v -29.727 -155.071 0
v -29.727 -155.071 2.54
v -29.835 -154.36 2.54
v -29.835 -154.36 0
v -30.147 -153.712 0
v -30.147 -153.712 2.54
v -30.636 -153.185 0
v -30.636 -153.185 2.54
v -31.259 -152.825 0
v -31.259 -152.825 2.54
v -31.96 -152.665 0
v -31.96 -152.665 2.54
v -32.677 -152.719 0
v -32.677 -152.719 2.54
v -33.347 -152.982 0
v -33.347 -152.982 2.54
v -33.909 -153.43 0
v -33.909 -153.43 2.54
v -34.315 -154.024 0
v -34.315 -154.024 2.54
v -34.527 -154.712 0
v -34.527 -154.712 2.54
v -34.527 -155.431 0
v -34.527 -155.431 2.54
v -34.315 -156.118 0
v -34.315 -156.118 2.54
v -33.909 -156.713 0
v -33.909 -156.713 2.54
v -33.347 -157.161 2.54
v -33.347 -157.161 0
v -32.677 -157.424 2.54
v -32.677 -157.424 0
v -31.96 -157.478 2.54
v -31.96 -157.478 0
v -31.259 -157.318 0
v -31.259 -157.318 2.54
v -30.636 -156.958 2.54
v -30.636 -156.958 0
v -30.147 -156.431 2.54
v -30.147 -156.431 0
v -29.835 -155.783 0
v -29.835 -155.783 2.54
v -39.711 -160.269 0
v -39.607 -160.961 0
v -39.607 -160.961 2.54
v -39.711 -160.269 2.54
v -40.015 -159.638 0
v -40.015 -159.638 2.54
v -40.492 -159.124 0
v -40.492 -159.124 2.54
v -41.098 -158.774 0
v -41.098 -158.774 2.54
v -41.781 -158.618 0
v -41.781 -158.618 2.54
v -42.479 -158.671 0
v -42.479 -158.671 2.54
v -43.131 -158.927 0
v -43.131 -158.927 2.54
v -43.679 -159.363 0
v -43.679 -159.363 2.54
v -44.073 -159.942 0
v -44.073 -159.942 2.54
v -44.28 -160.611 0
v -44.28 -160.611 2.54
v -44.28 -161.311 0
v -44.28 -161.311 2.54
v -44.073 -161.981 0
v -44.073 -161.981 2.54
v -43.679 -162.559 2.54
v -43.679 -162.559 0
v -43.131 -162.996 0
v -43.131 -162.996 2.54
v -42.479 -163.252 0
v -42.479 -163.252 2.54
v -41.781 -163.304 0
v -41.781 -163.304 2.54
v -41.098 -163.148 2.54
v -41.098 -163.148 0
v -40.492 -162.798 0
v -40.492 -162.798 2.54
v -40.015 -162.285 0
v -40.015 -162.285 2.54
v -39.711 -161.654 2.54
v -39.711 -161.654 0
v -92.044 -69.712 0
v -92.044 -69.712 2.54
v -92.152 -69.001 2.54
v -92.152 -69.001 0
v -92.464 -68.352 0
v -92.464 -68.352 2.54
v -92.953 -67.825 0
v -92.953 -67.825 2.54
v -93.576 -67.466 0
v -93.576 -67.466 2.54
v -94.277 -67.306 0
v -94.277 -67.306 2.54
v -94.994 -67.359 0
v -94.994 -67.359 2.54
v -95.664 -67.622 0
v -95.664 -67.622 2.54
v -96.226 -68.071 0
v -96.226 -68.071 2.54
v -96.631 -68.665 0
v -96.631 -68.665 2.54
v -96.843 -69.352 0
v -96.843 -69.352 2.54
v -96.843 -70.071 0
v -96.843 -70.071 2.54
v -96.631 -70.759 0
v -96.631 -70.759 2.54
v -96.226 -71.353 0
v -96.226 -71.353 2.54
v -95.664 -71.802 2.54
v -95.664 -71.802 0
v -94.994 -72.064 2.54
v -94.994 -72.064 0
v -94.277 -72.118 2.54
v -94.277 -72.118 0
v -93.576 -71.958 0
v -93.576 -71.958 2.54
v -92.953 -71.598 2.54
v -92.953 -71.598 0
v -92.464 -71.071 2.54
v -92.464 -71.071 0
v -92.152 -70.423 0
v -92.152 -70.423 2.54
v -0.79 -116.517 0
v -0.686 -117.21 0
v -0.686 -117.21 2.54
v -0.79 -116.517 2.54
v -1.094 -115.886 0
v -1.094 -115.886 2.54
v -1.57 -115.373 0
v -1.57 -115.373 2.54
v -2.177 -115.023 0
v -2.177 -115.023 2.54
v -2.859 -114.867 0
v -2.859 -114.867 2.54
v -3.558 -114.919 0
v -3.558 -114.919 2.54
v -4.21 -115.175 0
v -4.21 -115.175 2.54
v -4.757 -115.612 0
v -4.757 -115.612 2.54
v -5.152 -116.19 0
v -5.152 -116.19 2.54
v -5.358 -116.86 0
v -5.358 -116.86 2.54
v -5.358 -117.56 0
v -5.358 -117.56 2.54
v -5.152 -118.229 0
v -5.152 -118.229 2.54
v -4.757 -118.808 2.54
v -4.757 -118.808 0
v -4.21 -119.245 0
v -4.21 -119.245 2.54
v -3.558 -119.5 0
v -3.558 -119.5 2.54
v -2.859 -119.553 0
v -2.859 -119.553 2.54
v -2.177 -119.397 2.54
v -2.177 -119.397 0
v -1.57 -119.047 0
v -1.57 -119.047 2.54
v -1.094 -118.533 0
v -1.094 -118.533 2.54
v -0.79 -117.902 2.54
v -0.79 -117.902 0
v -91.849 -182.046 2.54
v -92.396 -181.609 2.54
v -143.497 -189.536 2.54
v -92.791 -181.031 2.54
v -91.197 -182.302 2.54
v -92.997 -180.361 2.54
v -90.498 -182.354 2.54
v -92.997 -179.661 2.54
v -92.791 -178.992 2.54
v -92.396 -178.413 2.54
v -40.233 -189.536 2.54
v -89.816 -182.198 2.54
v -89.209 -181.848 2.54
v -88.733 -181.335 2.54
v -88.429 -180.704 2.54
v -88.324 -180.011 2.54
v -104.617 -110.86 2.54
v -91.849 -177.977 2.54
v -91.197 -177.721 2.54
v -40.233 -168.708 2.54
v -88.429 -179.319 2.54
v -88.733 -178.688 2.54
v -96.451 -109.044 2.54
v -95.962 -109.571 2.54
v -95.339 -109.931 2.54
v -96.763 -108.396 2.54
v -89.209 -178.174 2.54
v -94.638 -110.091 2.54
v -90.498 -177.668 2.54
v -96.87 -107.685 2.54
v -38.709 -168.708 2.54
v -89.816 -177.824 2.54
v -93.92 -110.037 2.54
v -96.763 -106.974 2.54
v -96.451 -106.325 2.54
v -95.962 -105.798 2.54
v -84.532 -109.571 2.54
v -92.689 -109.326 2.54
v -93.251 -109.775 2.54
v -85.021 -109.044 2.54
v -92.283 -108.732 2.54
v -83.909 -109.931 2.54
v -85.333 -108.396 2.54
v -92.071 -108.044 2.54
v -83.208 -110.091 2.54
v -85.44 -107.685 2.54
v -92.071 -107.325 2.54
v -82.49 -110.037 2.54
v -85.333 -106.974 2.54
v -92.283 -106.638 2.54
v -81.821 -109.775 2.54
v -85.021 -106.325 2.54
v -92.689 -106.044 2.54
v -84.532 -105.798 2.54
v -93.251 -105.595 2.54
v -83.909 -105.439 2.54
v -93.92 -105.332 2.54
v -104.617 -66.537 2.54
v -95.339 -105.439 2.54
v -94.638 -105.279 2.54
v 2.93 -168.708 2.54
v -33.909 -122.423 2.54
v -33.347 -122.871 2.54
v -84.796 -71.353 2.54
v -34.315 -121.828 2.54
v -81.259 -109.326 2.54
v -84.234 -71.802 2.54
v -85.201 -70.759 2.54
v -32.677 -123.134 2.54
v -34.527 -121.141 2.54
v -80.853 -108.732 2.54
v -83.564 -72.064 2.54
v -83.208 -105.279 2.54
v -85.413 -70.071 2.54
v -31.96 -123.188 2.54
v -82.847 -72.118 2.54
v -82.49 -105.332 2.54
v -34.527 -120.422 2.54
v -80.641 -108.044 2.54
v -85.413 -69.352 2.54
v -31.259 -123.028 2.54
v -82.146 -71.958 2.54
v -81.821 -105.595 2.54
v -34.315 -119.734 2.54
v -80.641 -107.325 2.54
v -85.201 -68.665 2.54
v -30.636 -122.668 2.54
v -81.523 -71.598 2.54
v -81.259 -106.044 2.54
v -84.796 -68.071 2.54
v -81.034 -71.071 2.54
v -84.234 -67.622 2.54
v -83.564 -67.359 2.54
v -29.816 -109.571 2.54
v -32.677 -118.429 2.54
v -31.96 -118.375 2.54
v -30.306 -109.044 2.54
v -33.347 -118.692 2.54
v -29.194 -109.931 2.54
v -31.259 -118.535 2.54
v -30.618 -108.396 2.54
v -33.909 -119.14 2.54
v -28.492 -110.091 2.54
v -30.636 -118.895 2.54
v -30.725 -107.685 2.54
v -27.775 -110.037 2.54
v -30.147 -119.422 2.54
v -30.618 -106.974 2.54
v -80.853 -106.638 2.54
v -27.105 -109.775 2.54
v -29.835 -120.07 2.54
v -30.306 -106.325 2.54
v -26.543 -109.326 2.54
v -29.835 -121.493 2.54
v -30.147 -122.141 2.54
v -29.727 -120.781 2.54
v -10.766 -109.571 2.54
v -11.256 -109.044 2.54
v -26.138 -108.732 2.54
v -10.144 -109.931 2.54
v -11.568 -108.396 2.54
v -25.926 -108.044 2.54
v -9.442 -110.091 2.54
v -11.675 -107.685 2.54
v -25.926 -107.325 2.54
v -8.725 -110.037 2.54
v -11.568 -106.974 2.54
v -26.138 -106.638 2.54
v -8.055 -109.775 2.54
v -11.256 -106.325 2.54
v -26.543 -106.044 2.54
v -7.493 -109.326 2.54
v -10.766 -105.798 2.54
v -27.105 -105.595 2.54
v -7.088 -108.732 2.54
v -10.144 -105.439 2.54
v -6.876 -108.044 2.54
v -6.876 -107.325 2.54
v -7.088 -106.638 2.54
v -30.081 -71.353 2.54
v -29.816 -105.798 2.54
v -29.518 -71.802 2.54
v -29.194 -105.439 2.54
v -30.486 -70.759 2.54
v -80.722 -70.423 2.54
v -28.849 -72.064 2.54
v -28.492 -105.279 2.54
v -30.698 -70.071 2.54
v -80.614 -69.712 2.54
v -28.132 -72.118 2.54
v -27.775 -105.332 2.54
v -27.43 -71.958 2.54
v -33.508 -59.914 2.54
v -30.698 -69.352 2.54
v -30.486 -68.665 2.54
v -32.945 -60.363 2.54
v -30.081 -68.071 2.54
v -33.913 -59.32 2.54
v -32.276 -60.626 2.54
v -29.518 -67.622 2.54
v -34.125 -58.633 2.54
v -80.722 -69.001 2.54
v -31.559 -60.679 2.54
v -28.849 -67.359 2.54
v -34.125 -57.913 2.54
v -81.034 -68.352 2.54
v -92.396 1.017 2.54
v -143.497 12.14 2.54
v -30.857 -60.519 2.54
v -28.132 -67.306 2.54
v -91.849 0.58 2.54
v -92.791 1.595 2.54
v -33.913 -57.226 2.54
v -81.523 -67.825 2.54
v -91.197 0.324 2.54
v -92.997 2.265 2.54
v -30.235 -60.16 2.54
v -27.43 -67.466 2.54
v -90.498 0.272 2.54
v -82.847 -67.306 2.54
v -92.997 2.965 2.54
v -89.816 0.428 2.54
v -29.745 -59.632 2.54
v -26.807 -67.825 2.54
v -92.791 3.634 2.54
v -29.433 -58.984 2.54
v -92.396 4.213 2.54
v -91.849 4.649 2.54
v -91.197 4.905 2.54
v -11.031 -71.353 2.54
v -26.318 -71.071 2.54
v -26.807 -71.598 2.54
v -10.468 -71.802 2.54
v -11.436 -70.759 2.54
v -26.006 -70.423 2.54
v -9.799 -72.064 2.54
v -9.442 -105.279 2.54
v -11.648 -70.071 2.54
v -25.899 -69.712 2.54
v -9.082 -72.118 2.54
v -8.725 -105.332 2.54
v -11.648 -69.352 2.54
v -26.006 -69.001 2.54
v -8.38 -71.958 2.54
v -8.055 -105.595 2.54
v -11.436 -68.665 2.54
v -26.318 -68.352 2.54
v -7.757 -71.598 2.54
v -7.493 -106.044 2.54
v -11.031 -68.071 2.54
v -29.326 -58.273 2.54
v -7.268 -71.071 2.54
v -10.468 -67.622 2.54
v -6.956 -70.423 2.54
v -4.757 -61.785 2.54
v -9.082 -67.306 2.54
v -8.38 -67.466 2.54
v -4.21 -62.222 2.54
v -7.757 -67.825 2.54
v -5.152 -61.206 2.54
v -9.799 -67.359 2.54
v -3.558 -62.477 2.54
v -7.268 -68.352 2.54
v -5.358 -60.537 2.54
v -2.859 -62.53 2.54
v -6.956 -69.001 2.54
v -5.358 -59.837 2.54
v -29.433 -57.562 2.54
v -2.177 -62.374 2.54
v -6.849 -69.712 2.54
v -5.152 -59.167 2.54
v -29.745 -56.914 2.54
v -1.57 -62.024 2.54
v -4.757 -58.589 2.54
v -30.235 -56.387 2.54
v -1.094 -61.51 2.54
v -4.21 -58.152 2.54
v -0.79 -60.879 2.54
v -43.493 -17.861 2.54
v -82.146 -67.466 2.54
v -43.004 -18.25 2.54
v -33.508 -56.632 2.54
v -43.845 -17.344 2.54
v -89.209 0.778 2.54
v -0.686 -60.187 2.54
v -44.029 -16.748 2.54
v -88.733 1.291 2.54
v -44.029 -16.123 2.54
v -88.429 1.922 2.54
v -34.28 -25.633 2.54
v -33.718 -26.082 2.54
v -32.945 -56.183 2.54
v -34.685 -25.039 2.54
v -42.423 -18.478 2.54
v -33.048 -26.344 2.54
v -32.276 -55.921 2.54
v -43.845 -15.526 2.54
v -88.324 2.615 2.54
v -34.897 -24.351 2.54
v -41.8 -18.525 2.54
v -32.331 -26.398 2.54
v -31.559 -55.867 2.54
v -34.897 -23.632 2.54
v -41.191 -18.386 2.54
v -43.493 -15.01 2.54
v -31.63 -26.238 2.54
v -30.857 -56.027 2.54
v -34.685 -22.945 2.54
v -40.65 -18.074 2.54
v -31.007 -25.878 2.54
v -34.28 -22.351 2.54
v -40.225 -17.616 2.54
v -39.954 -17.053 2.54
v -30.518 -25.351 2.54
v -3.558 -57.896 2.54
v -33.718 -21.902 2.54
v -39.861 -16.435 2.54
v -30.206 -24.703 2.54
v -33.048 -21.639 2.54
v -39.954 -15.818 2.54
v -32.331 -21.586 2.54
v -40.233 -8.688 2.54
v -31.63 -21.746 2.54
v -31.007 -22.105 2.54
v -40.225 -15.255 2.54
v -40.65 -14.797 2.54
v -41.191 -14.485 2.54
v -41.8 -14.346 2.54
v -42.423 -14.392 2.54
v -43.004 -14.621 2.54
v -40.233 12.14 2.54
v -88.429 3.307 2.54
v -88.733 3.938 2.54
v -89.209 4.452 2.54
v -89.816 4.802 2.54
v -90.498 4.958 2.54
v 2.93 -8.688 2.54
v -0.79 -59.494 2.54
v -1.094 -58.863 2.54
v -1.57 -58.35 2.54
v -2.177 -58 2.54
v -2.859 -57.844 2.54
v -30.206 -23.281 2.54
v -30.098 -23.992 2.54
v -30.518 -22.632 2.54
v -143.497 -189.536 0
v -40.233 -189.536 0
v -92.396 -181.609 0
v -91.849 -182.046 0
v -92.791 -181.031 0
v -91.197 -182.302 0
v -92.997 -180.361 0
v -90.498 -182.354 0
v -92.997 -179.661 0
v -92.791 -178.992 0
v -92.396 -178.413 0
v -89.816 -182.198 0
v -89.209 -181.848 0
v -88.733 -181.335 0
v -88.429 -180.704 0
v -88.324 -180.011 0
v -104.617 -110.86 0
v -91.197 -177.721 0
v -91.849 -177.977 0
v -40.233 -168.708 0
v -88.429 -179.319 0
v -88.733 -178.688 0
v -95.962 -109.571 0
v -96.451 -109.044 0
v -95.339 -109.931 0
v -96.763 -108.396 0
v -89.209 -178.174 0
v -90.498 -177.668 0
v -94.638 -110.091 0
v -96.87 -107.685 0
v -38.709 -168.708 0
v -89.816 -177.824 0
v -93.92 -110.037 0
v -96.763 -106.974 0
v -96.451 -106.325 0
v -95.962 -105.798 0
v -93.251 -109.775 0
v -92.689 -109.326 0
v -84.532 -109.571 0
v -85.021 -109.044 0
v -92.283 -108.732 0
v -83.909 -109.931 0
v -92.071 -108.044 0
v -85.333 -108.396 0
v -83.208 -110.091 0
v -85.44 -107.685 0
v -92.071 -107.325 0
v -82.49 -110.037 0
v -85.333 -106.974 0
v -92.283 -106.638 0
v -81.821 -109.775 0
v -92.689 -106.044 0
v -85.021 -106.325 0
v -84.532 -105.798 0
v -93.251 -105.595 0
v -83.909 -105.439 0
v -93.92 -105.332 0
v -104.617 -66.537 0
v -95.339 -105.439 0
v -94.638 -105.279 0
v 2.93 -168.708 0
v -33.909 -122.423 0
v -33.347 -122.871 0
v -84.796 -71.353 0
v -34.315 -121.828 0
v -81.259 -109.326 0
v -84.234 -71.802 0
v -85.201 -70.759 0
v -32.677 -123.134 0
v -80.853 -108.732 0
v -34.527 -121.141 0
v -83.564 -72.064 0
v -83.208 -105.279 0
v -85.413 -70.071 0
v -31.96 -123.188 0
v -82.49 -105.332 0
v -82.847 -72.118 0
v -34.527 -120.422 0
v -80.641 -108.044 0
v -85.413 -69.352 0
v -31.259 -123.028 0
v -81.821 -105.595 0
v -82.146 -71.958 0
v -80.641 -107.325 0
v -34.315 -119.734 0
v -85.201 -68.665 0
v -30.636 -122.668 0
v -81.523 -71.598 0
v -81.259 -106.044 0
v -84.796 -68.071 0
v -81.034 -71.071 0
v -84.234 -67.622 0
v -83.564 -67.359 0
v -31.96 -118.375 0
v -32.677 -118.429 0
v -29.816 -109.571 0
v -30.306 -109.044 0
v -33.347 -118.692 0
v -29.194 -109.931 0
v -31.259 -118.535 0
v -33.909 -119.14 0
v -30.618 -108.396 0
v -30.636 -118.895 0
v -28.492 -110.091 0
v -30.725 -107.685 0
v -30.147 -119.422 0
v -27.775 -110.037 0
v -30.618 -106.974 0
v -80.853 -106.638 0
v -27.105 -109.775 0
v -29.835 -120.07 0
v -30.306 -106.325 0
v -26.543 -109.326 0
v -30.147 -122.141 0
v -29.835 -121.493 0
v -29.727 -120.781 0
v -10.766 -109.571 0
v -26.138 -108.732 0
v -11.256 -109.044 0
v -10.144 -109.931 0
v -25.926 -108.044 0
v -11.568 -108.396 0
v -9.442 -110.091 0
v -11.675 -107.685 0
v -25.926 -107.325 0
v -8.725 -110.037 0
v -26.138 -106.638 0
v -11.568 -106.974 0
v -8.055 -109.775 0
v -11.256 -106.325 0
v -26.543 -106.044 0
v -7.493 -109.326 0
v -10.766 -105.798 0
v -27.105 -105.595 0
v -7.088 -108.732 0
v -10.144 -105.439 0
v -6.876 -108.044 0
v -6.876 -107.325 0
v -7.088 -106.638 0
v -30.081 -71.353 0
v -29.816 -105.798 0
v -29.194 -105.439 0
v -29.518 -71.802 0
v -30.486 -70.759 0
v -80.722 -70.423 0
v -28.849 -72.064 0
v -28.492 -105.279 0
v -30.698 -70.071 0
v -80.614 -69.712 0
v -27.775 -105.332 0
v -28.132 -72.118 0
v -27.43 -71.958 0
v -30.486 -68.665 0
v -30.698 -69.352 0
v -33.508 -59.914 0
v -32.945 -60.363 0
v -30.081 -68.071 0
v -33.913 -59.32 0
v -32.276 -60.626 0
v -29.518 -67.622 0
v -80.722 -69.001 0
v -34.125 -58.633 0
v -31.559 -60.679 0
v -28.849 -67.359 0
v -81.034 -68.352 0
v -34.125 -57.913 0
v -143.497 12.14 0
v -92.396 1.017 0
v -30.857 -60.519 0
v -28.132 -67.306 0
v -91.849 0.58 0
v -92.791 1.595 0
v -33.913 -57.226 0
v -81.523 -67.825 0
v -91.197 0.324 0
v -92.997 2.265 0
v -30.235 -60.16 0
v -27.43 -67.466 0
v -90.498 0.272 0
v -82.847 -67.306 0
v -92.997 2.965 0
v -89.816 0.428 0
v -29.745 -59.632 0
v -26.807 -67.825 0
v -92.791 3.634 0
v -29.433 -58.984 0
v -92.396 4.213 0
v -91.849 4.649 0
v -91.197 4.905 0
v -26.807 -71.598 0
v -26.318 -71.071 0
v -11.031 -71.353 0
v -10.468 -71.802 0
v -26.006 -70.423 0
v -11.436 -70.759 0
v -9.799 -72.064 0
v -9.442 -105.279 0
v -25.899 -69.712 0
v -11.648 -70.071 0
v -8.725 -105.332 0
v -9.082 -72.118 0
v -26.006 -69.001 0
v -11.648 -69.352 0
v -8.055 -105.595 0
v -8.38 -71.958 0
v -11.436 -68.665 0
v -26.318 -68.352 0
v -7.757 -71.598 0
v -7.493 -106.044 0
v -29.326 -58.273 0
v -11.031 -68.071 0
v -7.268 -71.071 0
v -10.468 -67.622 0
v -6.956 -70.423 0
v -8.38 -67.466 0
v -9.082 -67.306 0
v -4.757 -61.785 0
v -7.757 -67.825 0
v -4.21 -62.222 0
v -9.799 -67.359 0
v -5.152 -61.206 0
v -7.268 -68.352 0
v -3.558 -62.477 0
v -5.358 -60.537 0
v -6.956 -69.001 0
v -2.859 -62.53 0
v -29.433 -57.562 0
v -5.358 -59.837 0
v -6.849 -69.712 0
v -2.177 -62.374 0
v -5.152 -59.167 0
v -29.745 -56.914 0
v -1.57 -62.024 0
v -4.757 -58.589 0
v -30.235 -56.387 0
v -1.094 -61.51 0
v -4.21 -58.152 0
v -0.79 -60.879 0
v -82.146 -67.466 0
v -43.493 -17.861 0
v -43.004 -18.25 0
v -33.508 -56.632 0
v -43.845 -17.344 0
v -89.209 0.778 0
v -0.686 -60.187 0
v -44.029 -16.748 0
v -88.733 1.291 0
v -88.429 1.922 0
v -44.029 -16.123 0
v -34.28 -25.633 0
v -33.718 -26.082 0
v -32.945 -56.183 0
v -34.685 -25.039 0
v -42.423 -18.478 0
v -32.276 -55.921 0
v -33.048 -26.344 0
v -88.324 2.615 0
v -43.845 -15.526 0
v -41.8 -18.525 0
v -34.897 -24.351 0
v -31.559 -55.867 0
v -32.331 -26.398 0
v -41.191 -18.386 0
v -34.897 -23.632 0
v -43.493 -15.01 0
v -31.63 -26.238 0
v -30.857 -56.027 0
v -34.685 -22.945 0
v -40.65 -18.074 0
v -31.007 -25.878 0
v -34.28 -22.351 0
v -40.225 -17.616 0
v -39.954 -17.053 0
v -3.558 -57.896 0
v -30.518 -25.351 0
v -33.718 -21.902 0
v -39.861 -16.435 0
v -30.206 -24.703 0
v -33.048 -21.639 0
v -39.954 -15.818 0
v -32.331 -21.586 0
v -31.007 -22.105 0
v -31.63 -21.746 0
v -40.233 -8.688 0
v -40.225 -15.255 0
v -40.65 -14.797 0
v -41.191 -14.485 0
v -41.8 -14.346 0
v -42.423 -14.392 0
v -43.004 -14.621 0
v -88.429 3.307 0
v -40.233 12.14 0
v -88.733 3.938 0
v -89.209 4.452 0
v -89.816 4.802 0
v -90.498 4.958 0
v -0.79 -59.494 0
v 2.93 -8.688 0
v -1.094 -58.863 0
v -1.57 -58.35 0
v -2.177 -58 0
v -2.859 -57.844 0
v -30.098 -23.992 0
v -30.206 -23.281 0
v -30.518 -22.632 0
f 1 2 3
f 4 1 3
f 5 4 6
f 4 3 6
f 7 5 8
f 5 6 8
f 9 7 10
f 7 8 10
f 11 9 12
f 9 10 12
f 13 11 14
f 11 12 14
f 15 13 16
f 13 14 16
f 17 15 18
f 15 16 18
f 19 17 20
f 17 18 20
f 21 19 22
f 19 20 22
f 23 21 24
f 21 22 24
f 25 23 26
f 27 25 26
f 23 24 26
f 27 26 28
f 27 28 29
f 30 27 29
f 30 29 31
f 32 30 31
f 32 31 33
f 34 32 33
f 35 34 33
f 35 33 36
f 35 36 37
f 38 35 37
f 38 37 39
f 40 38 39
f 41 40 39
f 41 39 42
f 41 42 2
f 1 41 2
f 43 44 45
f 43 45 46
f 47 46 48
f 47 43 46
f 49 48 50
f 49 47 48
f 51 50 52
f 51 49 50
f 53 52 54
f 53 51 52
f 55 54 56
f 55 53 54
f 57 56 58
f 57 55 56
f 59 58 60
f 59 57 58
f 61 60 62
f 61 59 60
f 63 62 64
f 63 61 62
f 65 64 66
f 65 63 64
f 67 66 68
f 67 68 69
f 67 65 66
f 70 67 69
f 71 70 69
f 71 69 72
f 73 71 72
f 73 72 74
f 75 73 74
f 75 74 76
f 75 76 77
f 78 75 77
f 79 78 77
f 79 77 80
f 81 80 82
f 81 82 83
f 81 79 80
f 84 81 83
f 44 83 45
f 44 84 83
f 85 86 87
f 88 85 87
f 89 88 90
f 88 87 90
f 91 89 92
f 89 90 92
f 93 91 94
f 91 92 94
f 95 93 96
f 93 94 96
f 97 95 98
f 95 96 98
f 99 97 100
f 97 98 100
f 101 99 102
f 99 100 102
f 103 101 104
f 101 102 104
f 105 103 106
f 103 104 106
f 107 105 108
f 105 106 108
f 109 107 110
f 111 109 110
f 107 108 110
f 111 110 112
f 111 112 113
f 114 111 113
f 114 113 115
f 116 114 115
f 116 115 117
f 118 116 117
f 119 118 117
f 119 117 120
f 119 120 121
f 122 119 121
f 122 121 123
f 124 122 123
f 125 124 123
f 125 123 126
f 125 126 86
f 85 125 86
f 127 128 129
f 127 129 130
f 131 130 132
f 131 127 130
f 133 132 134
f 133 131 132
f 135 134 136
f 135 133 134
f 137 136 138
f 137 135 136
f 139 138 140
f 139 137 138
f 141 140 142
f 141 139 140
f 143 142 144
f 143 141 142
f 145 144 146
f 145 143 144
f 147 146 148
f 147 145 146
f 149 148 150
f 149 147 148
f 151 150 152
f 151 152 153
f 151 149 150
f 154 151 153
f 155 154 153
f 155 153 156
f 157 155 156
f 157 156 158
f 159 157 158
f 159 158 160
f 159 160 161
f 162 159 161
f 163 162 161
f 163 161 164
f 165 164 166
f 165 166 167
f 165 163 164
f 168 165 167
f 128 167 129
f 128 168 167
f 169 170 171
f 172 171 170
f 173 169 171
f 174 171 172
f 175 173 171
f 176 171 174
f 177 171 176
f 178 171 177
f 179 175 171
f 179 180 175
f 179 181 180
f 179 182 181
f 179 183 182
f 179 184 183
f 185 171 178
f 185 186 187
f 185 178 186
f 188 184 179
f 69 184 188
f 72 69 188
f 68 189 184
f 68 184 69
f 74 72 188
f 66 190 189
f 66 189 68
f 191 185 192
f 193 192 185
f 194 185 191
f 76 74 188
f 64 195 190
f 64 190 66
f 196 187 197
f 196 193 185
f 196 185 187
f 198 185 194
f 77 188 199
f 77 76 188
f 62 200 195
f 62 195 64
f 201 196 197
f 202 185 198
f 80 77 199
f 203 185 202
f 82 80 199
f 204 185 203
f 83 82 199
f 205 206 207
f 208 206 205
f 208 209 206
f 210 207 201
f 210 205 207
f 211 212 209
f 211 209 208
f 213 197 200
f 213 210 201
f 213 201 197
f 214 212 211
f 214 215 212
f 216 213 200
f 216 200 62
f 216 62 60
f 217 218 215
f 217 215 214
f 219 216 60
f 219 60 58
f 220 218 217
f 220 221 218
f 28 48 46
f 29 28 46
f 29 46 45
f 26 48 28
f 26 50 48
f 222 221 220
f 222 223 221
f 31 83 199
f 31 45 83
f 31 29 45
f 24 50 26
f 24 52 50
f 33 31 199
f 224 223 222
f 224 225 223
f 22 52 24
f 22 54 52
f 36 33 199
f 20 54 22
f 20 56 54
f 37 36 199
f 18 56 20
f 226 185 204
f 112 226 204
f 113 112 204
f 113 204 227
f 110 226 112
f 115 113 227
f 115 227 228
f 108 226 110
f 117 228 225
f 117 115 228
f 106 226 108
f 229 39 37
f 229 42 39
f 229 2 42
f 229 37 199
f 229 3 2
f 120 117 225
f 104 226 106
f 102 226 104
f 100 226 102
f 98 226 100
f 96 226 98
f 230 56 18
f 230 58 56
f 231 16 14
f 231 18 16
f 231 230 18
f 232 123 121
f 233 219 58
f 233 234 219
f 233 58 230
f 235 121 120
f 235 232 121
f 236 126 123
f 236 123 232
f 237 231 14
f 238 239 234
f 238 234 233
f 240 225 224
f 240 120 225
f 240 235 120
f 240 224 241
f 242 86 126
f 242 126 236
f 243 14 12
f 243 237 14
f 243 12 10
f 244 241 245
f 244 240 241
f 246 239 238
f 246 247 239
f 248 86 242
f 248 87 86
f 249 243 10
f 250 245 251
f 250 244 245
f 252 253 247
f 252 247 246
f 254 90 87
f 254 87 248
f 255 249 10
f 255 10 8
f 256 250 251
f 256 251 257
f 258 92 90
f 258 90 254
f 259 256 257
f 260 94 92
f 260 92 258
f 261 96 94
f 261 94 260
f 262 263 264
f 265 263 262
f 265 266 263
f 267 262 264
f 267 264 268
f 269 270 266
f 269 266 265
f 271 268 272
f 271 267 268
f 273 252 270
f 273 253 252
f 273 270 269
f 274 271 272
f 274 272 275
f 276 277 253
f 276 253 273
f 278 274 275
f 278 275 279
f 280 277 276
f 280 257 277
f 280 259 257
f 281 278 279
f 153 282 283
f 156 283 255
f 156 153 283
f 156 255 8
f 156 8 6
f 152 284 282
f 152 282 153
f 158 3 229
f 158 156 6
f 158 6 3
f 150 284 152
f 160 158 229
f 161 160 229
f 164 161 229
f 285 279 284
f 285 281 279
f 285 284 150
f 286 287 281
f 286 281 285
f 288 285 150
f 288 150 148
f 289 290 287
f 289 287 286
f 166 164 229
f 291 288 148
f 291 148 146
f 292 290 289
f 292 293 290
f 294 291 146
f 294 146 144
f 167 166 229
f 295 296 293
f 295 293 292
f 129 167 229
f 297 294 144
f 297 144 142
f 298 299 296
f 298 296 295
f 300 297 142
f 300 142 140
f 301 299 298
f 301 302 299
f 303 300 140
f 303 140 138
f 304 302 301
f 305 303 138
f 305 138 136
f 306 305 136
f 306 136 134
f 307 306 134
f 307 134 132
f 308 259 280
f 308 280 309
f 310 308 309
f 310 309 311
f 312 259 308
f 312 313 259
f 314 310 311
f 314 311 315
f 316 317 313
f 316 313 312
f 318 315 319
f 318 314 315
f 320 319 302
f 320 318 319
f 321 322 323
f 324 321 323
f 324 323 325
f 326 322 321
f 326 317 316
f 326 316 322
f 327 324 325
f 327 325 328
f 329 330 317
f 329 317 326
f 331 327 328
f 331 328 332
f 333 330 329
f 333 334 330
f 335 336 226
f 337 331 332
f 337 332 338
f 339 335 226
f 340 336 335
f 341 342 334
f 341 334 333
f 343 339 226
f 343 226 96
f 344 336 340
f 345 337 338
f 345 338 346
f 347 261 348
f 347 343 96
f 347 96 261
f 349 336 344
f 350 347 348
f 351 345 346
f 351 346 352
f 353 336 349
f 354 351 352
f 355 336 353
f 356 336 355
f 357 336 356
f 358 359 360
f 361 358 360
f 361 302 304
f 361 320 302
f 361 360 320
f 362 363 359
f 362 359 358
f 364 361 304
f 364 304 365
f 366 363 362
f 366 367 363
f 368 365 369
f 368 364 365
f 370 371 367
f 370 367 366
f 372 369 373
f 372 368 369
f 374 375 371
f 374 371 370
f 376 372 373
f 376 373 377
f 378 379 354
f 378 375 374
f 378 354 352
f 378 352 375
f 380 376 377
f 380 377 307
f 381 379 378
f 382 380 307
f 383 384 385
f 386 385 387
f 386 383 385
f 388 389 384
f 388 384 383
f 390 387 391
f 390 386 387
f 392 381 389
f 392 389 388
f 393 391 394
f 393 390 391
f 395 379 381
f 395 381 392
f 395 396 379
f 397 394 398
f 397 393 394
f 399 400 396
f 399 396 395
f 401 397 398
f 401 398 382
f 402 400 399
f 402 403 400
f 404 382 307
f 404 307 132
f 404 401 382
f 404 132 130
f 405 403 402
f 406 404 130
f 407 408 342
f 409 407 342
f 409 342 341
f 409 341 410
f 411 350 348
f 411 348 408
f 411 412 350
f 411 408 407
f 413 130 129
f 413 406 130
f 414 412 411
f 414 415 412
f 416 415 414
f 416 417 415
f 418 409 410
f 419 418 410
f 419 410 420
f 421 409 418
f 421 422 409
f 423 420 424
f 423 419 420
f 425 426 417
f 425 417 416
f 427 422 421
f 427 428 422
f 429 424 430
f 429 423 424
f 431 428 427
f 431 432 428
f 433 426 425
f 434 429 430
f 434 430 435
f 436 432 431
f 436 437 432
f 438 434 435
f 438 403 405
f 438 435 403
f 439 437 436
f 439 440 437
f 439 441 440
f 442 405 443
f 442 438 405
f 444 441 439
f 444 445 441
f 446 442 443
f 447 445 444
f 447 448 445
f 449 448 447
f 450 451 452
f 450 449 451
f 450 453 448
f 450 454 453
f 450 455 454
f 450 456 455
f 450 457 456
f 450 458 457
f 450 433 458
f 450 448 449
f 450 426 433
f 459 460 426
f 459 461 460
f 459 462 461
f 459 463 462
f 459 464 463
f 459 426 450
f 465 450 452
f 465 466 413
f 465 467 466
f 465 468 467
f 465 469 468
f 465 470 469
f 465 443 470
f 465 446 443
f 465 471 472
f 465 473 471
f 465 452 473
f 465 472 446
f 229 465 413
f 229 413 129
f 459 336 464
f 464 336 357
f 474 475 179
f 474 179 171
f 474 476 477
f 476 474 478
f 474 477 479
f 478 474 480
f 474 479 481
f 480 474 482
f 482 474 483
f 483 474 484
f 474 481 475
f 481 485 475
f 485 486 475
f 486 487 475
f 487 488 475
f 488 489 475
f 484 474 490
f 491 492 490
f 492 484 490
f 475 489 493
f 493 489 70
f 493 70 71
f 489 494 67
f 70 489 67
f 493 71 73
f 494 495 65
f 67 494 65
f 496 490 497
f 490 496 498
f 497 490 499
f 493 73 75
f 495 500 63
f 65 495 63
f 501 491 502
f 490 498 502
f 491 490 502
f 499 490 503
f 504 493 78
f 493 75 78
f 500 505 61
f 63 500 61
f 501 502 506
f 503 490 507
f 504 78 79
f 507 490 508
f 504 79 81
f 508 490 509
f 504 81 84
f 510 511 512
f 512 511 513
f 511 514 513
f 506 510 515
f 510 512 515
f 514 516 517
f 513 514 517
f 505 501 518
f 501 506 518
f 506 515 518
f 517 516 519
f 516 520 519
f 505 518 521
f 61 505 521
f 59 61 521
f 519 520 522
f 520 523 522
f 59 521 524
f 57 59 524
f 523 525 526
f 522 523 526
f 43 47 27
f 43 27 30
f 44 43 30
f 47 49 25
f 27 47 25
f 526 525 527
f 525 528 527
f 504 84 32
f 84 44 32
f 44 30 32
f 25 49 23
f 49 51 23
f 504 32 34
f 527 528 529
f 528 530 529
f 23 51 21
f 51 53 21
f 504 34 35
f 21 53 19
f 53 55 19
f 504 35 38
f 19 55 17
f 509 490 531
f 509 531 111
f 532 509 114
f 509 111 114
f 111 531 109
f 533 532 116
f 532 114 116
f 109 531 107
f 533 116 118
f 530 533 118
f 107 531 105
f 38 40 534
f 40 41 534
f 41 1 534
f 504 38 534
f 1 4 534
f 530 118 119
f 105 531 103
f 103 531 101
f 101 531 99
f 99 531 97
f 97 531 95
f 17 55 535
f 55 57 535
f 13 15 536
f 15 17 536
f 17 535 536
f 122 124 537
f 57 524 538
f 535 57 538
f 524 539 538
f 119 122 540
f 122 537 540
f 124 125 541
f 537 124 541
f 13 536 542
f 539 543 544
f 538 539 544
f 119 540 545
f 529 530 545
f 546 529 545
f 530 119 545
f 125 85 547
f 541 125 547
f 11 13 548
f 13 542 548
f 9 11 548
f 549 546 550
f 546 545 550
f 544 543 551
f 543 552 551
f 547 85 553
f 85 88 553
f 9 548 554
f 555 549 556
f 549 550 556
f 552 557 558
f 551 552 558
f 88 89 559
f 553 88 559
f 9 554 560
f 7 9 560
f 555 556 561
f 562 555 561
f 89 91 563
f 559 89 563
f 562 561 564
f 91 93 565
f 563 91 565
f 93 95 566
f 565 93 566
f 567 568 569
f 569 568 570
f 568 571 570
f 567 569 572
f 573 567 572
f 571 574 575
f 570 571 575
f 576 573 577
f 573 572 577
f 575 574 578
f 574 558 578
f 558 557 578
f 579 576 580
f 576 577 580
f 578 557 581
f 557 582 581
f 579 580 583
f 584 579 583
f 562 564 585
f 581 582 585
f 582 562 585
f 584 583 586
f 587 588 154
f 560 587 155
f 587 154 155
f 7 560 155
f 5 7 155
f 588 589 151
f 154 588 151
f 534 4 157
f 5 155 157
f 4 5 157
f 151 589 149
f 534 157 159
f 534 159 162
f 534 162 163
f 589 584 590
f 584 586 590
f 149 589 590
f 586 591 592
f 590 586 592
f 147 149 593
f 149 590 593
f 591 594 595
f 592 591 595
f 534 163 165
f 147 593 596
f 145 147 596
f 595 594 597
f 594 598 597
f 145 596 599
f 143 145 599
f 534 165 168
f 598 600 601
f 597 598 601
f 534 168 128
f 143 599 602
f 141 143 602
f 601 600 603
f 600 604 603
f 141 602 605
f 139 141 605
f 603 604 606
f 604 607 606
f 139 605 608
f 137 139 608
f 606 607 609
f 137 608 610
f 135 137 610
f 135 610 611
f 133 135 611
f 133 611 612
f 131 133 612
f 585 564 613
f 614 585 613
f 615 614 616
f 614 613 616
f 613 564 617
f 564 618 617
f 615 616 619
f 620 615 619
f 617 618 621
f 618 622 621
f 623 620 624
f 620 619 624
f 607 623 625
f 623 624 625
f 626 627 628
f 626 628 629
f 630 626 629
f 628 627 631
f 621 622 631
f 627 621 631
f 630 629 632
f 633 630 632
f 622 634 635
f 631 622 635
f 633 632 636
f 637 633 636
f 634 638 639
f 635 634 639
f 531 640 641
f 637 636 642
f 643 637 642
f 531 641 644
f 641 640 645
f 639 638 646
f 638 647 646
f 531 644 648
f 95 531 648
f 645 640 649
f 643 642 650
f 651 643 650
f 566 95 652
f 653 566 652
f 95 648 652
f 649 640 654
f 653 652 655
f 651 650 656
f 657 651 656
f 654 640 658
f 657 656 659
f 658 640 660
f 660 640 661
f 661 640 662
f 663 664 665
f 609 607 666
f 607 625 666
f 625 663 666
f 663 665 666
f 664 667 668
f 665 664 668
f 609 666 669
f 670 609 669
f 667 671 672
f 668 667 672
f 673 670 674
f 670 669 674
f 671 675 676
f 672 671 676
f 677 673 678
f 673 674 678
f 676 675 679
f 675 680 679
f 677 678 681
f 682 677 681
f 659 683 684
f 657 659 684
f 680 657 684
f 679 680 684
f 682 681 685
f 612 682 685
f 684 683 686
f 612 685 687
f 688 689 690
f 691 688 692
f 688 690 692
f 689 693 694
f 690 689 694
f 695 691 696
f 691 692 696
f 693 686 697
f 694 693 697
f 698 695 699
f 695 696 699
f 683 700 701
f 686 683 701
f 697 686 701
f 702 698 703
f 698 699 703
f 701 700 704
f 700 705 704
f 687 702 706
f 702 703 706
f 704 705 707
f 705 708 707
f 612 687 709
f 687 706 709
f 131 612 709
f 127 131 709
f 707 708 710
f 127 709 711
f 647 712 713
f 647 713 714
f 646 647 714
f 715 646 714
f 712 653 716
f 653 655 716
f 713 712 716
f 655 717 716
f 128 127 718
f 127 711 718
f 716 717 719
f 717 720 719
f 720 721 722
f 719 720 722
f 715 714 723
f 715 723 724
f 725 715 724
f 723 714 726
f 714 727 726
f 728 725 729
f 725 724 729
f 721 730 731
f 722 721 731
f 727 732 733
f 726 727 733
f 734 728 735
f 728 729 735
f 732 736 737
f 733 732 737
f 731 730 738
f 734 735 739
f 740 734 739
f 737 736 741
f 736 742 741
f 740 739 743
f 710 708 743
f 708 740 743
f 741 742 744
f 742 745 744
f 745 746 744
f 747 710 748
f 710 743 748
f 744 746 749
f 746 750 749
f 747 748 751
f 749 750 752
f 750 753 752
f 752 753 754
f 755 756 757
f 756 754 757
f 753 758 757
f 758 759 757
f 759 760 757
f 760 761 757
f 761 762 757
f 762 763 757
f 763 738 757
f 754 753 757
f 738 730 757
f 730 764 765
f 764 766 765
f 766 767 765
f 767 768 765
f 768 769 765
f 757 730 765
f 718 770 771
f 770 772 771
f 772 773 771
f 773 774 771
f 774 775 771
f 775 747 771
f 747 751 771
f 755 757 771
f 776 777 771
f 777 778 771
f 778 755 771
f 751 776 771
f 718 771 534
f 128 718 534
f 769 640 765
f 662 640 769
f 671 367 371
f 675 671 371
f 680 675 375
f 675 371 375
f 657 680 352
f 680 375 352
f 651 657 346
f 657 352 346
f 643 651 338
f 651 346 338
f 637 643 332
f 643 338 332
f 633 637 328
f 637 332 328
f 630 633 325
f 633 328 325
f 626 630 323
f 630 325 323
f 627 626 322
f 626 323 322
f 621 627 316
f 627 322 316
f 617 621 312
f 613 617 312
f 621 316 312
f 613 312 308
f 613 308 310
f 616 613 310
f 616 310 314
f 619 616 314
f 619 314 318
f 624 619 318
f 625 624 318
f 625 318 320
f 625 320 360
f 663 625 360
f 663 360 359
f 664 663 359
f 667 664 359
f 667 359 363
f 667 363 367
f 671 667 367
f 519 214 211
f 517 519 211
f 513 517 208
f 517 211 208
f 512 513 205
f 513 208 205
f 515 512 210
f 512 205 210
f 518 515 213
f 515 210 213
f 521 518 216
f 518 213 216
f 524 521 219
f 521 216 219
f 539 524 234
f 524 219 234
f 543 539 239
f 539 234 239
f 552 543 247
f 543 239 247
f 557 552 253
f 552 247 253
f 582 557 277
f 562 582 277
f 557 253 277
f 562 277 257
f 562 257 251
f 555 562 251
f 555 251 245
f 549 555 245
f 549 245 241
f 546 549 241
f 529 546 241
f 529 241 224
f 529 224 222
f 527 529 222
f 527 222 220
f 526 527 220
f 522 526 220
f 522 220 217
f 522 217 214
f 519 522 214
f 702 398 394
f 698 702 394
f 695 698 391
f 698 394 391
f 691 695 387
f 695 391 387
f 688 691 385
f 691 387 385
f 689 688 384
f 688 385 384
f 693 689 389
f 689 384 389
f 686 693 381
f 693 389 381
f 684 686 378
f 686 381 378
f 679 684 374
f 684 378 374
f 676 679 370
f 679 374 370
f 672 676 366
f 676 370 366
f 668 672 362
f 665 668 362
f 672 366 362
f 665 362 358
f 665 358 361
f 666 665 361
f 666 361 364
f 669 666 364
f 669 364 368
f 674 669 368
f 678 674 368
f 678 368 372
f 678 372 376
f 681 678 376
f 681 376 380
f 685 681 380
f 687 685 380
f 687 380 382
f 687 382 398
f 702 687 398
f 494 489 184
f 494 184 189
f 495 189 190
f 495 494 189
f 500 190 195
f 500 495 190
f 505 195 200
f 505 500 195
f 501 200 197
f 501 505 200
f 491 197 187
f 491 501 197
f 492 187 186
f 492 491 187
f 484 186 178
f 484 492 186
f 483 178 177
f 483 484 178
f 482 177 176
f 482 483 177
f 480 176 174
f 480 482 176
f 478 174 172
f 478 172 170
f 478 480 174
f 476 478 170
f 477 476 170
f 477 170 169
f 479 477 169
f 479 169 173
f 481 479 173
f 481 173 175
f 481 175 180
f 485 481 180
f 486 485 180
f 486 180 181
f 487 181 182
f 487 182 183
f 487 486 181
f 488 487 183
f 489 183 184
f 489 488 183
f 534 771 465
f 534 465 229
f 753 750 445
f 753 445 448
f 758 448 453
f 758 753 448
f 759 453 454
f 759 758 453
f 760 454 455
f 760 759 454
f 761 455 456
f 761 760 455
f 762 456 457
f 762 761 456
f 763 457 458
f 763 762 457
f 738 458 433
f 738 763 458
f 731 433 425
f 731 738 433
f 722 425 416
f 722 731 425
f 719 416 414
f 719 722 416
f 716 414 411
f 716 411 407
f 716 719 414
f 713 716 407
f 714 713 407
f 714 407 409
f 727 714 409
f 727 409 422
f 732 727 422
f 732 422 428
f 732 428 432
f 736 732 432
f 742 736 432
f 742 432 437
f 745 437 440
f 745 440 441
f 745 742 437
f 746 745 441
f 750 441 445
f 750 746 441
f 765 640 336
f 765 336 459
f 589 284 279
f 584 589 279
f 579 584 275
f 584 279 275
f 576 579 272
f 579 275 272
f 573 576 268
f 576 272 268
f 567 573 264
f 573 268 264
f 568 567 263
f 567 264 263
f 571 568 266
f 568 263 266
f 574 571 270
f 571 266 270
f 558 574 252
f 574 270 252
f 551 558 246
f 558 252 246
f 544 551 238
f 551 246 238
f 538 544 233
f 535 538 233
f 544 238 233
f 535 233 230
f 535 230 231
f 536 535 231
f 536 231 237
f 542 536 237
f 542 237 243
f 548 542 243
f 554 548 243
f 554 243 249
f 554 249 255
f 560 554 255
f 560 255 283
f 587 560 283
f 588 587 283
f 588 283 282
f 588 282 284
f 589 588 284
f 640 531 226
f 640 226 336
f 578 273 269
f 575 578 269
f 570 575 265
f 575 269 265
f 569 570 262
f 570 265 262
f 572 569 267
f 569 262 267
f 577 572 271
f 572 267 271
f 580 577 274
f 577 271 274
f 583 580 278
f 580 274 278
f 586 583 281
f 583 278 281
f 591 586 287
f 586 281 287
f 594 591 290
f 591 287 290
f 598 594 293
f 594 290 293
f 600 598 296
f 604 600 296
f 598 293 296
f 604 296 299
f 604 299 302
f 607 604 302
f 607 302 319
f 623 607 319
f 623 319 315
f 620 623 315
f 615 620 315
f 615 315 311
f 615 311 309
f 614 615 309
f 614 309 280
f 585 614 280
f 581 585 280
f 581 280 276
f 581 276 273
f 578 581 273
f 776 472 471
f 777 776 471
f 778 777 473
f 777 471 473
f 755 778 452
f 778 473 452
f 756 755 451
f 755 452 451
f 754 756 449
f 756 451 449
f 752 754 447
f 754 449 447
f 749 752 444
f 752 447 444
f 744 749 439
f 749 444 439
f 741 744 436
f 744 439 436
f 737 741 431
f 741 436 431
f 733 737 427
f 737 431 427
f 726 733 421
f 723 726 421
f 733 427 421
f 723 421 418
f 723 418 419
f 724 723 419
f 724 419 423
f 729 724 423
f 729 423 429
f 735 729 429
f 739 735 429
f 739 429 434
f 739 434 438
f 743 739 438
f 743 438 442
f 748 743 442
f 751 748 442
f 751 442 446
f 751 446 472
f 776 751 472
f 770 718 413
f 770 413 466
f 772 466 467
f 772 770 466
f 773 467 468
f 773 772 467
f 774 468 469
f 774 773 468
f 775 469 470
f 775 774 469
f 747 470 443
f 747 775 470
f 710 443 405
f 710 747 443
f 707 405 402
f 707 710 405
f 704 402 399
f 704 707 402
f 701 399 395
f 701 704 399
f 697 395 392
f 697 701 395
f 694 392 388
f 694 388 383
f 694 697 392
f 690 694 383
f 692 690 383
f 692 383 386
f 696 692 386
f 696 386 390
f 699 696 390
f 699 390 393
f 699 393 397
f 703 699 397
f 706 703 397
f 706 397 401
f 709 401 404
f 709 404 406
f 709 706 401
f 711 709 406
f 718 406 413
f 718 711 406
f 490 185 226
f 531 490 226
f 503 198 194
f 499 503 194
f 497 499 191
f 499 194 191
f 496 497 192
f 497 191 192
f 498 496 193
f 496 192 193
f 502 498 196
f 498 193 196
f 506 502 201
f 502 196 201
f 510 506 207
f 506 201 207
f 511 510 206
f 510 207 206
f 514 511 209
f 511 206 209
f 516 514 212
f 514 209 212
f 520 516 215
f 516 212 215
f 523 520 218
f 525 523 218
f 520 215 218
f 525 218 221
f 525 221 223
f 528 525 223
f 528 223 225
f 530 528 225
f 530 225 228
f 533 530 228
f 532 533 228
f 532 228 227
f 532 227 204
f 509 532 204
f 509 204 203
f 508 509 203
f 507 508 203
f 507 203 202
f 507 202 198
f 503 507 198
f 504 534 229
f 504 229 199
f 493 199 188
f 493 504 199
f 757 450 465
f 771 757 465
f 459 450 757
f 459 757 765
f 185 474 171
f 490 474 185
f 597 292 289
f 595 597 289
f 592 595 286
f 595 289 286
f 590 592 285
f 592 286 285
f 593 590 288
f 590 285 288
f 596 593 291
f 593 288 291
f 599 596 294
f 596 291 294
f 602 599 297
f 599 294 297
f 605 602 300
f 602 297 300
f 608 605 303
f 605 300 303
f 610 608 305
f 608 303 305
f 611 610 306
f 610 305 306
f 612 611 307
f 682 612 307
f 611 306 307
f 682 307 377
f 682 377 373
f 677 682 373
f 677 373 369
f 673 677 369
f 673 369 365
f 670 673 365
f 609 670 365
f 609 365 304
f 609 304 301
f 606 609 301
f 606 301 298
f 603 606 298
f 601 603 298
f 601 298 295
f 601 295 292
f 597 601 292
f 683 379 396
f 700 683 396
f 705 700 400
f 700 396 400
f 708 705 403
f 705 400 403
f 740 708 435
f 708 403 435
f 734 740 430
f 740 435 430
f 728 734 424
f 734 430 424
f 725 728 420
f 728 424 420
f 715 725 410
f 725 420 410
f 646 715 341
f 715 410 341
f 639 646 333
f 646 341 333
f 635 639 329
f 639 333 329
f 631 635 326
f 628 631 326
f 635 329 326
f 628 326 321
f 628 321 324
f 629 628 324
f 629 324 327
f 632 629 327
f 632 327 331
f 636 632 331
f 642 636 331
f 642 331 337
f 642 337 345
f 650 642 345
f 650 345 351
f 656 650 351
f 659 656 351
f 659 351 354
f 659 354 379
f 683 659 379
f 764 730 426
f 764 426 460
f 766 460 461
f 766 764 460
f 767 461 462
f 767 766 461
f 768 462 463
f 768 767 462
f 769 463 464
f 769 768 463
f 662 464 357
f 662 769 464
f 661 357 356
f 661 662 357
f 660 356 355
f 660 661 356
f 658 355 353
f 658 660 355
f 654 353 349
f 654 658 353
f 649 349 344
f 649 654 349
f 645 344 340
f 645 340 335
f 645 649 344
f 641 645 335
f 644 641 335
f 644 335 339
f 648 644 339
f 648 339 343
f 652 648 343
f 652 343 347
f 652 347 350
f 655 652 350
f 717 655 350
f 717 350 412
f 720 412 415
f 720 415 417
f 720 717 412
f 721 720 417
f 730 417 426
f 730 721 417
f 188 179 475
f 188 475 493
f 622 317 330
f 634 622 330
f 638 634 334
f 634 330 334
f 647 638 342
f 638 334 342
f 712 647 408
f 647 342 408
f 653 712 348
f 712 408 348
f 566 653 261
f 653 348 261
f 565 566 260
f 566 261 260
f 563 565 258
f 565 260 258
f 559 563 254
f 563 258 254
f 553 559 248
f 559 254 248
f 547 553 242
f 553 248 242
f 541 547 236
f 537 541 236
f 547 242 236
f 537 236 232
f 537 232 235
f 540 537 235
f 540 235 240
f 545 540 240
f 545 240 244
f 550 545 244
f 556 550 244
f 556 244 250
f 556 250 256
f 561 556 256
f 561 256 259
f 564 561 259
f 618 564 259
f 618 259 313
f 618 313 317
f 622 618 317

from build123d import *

# Parameters (mm, degrees)
SKETCH2_R           = 2.3495
SKETCH2_R_2         = 2.0955
BOSS_EXTRUDE1_DEPTH = 2.54
SKETCH3_W           = 31.75
SKETCH3_H           = 44.323
BOSS_EXTRUDE2_DEPTH = 2.54
SKETCH4_R           = 2.413
CUT_EXTRUDE1_DEPTH  = 238.743265275
SKETCH5_R           = 2.413
CUT_EXTRUDE2_DEPTH  = 238.743265275
SKETCH6_R           = 2.413
CUT_EXTRUDE3_DEPTH  = 238.743265275
SKETCH7_R           = 2.413
CUT_EXTRUDE4_DEPTH  = 238.743265275
SKETCH8_W           = 7.994763
SKETCH8_H           = 21.113506736
SKETCH8_W_2         = 21.493659396
SKETCH8_H_2         = 28.960940125
CUT_EXTRUDE5_DEPTH  = 238.743265275


with BuildPart() as part:
    # Sketch2 → Boss-Extrude1 (new body)
    with BuildSketch(Plane(origin=(0, 0, 0), x_dir=(-1, 0, 0), z_dir=(0, 0, 1))):
        Polygon((-2.930050059, 168.708281075), (38.709428475, 168.708281075), (38.709428475, 189.536281075), (143.497061781, 189.536281075), (104.617436481, 110.859781075), (72.867436481, 110.859781075), (72.867436481, 66.536781075), (104.617436481, 66.536781075), (143.497061781, -12.139718925), (38.709428475, -12.139718925), (38.709428475, 8.688281075), (-2.930050059, 8.688281075), align=None)
        with Locations(Location((41.95655448, 160.961281075, 0), (0, 0, 180))):
            Circle(SKETCH2_R, mode=Mode.SUBTRACT)
        with Locations(Location((90.673911143, 180.011281075, 0), (0, 0, 180))):
            Circle(SKETCH2_R, mode=Mode.SUBTRACT)
        with Locations(Location((90.673911143, -2.614718925, 0), (0, 0, 180))):
            Circle(SKETCH2_R, mode=Mode.SUBTRACT)
        with Locations(Location((3.035061781, 117.209781075, 0), (0, 0, 180))):
            Circle(SKETCH2_R, mode=Mode.SUBTRACT)
        with Locations(Location((3.035061781, 60.186781075, 0), (0, 0, 180))):
            Circle(SKETCH2_R, mode=Mode.SUBTRACT)
        with Locations(Location((41.95655448, 16.435281075, 0), (0, 0, 180))):
            Circle(SKETCH2_R_2, mode=Mode.SUBTRACT)
    extrude(amount=BOSS_EXTRUDE1_DEPTH)

    # Sketch3 → Boss-Extrude2 (add)
    with BuildSketch(Plane.XY.offset(2.54)):
        with Locations((-88.742436481, -88.698281075)):
            Rectangle(SKETCH3_W, SKETCH3_H)
    extrude(amount=-BOSS_EXTRUDE2_DEPTH)

    # Sketch4 → Cut-Extrude1 (cut, through all)
    with BuildSketch(Plane.XY.offset(2.54)):
        with Locations((-94.457436481, -69.711781075)):
            Circle(SKETCH4_R)
        with Locations((-83.027436481, -69.711781075)):
            Circle(SKETCH4_R)
        with Locations((-28.311949941, -69.711781075)):
            Circle(SKETCH4_R)
        with Locations((-9.261949941, -69.711781075)):
            Circle(SKETCH4_R)
        with Locations(Location((-9.261949941, -107.684781075, 0), (0, 0, 180))):
            Circle(SKETCH4_R)
        with Locations(Location((-28.311949941, -107.684781075, 0), (0, 0, 180))):
            Circle(SKETCH4_R)
        with Locations(Location((-83.027436481, -107.684781075, 0), (0, 0, 180))):
            Circle(SKETCH4_R)
        with Locations(Location((-94.457436481, -107.684781075, 0), (0, 0, 180))):
            Circle(SKETCH4_R)
    extrude(amount=-CUT_EXTRUDE1_DEPTH, mode=Mode.SUBTRACT)

    # Sketch5 → Cut-Extrude2 (cut, through all)
    with BuildSketch(Plane.XY.offset(2.54)):
        with Locations((-31.738991634, -58.273080522)):
            Circle(SKETCH5_R)
    extrude(amount=-CUT_EXTRUDE2_DEPTH, mode=Mode.SUBTRACT)

    # Sketch6 → Cut-Extrude3 (cut, through all)
    with BuildSketch(Plane.XY.offset(2.54)):
        with Locations((-32.511395831, -23.991781075)):
            Circle(SKETCH6_R)
    extrude(amount=-CUT_EXTRUDE3_DEPTH, mode=Mode.SUBTRACT)

    # Sketch7 → Cut-Extrude4 (cut, through all)
    with BuildSketch(Plane.XY.offset(2.54)):
        with Locations((-32.140467993, -155.071444629)):
            Circle(SKETCH7_R)
        with Locations((-32.140467993, -120.781444629)):
            Circle(SKETCH7_R)
    extrude(amount=-CUT_EXTRUDE4_DEPTH, mode=Mode.SUBTRACT)

    # Sketch8 → Cut-Extrude5 (cut, through all)
    with BuildSketch(Plane.XY.offset(2.54)):
        with Locations((-36.236046975, 1.868472293)):
            Rectangle(SKETCH8_W, SKETCH8_H)
        with Locations((-29.486598777, -183.188751137)):
            Rectangle(SKETCH8_W_2, SKETCH8_H_2)
    extrude(amount=-CUT_EXTRUDE5_DEPTH, mode=Mode.SUBTRACT)


solid = part.part
